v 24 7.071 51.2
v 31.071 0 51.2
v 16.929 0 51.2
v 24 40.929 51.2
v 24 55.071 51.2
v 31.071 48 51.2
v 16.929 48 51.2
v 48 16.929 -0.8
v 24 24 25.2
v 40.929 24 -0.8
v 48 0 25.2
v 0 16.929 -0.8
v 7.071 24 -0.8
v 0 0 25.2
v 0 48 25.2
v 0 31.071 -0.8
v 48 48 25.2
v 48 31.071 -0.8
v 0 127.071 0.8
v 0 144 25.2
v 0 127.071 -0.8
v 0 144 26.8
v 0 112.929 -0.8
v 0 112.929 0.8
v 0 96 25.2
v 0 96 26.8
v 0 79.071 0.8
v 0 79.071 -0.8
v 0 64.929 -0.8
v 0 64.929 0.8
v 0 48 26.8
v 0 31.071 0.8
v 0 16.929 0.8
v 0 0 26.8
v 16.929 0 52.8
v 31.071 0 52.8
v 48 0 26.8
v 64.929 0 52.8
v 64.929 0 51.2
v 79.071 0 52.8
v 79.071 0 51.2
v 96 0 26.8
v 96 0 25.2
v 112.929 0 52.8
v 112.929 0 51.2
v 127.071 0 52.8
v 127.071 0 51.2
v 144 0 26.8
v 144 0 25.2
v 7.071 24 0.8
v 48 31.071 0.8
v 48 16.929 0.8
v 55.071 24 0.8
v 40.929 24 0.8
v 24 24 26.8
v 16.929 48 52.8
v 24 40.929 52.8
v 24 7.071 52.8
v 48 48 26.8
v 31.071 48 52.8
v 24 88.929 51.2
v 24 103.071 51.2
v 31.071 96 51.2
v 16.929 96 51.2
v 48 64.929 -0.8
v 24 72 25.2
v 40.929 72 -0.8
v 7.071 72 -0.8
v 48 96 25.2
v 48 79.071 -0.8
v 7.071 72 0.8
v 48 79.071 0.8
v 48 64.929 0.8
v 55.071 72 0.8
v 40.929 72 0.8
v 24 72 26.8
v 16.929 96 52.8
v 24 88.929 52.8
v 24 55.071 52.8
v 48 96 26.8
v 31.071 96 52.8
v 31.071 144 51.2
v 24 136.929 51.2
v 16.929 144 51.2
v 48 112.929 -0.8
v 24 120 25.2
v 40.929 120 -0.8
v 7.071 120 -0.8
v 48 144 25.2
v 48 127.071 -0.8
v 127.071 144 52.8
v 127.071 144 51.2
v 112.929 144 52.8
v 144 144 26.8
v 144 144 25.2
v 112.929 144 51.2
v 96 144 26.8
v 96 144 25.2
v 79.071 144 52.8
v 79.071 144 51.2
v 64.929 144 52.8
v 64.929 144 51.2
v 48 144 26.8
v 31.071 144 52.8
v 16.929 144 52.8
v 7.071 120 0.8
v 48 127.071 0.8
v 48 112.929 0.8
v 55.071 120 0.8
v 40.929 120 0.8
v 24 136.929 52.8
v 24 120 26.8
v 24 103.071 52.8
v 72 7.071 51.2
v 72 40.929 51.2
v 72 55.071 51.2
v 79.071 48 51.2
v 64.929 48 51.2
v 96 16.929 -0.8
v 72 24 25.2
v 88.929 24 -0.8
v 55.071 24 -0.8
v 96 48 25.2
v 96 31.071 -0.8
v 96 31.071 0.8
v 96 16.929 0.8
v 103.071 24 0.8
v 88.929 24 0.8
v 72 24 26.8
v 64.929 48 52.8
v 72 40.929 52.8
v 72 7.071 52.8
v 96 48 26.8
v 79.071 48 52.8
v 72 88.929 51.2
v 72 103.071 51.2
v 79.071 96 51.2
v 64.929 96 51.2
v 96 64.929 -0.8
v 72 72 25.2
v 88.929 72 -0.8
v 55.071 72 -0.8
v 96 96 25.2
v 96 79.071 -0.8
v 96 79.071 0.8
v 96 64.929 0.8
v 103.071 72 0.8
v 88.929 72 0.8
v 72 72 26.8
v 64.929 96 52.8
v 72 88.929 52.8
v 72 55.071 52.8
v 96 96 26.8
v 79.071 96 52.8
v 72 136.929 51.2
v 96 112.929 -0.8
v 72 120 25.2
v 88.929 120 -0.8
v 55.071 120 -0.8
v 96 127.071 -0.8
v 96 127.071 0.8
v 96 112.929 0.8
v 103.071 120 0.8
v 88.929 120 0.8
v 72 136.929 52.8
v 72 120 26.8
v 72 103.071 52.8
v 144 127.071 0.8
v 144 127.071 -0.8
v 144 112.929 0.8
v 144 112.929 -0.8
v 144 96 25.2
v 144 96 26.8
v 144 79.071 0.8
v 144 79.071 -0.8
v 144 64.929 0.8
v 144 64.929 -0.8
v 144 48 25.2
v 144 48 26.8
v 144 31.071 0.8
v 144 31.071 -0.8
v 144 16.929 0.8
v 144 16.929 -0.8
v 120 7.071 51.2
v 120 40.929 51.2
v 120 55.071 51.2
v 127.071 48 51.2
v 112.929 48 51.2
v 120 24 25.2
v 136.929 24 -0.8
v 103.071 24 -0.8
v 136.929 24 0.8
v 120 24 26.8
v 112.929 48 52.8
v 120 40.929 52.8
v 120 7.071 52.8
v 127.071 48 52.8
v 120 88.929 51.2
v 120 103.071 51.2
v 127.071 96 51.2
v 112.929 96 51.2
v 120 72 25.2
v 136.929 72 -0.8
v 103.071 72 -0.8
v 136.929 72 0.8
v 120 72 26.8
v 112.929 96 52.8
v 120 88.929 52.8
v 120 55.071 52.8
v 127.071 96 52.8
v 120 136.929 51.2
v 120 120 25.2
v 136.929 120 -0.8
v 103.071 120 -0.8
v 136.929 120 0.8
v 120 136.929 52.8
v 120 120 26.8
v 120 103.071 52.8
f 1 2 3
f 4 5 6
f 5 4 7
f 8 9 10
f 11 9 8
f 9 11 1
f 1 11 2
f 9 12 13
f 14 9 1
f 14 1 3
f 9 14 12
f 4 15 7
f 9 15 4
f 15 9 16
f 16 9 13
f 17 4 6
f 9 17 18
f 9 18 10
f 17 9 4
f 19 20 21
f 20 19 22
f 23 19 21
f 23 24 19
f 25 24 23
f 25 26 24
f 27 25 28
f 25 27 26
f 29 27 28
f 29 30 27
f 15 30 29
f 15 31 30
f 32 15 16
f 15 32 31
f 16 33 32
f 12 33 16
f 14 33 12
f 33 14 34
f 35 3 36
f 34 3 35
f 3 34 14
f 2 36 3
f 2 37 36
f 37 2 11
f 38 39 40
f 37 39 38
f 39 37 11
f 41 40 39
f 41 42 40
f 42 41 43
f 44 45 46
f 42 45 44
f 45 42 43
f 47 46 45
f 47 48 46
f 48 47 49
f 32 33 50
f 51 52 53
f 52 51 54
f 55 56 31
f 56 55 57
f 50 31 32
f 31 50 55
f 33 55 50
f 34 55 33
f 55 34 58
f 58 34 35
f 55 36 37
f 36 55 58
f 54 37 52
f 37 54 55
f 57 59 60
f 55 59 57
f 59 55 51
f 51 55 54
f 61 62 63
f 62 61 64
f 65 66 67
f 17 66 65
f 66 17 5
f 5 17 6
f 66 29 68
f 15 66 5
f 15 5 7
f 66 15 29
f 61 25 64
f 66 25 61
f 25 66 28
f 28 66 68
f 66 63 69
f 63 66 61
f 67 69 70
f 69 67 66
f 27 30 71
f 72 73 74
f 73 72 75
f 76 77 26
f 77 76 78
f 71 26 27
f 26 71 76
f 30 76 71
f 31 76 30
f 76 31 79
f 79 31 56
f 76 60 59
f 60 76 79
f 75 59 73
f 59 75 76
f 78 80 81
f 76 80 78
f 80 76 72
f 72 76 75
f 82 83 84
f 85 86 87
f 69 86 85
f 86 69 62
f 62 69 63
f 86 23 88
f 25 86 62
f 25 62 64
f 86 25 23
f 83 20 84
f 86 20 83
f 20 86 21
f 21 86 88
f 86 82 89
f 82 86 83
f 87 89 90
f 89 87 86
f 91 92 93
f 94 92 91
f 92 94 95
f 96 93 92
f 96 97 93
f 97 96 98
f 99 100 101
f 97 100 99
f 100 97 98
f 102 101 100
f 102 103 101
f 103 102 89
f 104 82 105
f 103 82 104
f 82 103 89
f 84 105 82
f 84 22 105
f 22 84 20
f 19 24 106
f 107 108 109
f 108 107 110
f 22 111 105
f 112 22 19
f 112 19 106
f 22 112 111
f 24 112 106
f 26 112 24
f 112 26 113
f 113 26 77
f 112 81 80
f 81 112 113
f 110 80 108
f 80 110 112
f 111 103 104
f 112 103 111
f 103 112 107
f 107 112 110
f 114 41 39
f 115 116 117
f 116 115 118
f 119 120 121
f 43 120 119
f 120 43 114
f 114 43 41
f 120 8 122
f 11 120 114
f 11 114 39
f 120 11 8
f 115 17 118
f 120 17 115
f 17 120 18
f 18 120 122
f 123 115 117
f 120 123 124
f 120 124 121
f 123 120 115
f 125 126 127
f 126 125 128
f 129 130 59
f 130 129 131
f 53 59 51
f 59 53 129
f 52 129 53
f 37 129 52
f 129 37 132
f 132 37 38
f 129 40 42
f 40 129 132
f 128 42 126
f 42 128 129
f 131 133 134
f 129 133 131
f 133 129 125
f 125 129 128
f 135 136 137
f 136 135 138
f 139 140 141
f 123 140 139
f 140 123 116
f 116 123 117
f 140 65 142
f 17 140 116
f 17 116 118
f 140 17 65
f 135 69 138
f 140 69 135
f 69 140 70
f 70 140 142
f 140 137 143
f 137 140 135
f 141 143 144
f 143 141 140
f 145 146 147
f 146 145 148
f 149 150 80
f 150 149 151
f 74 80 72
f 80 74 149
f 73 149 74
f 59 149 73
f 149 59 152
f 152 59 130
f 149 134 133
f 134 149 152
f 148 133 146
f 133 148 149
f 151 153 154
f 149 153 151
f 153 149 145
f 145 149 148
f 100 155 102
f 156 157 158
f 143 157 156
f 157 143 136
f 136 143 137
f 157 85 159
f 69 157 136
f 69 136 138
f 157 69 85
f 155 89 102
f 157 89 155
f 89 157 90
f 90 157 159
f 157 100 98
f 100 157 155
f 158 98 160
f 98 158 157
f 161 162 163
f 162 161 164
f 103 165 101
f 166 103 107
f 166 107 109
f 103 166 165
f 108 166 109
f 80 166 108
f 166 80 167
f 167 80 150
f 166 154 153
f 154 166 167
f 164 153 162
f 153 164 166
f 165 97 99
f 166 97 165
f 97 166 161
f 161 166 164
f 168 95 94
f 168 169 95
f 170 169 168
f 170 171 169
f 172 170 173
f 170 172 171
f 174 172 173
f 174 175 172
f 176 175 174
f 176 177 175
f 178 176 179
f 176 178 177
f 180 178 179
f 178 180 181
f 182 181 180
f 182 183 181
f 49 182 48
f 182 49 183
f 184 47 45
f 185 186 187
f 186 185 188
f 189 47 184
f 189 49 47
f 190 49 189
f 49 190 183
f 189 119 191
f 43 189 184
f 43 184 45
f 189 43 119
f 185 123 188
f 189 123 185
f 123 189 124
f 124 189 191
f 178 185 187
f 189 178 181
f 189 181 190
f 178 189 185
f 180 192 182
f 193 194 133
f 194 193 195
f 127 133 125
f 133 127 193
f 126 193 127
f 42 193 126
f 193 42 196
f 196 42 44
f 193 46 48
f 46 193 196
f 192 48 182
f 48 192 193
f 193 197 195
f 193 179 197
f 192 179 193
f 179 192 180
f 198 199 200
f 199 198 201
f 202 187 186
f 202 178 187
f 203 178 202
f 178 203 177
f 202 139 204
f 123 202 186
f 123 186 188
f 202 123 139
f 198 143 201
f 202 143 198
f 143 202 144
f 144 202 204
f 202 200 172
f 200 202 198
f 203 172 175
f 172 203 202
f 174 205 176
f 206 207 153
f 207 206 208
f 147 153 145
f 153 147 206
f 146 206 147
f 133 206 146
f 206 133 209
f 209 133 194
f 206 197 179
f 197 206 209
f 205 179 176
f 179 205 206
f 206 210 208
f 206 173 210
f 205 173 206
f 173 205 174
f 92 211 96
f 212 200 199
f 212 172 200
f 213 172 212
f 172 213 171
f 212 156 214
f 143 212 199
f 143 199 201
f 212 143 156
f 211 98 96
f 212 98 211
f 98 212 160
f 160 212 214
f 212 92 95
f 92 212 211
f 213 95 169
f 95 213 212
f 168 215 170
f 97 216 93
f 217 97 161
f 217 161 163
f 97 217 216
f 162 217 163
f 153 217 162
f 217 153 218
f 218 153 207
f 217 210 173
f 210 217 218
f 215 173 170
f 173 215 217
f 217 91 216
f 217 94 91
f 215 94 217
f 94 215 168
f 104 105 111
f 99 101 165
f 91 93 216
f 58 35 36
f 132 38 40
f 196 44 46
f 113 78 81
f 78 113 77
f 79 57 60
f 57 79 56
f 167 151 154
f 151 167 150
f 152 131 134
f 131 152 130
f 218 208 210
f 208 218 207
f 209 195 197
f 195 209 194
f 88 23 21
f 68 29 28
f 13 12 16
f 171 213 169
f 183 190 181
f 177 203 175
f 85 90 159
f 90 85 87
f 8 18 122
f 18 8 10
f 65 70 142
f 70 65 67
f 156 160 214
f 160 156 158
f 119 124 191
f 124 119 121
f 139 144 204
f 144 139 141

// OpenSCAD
height=52;
width=48;
top=10;
thickness=1.6;
$fn=60;
x_count=3;
y_count=3;
version="B"; // [0,0] module ; A B C D

r=top/2;                    // 45d.
R=width*sqrt(2)/2-top/2;    // 45d.
dr=r*sqrt(2);               // 0d.  // = width-dR
dR=R*sqrt(2);               // 0d.  // = width-dr
dim=width/2;
h=height;
t=thickness/2;

module quarter(){
    intersection() {
        cube([dim,dim,h]);
        cylinder(h,dR,dr,$fn=4);
    }
}
module single_cylinder(){
    intersection() {
        translate([-dim,-dim,0])cube([2*dim,2*dim,h]);
        cylinder(h,dR,dr,$fn=4);
    }
}
module single_4(){
    single_cylinder();
    translate([2*dim,0,0]) single_cylinder();
    translate([0,2*dim,0]) single_cylinder();
    translate([2*dim,2*dim,0]) single_cylinder();
}

module single(v) {
    intersection(){
        cube([2*dim,2*dim,h]);
        if (v=="A")
            single_4();
        else if(v=="B")
            translate([-dim,0,0]) single_4();
        else if(v=="C") 
            translate([-dim,-dim,0]) single_4();
        else if(v=="D")
            translate([0,-dim,0]) single_4();
        else ;
    }
}

function opposed(v) =
let ( m=search(v,"ABCD"), n=(m[0]+2)%4 )
"ABCD"[n];

module all(xc,yc,v){
for (x=[0:xc-1]) for (y=[0:yc-1]) {
    translate([x*2*dim,y*2*dim,-t])
        single(v);
    translate([x*2*dim,y*2*dim,h+t]) mirror([0,0,1])
        single(opposed(v));
    }
}

module reverse_all(xc,yc,v) {
    difference() {
        translate([0,0,-t])
            cube([xc*2*dim,yc*2*dim,h+2*t]);
        all(xc,yc,v);
        
    }
}

// quarter();
// single_cylinder();
// single_4();
// single(version);
// all(x_count,y_count,version);
reverse_all(x_count,y_count,version);
